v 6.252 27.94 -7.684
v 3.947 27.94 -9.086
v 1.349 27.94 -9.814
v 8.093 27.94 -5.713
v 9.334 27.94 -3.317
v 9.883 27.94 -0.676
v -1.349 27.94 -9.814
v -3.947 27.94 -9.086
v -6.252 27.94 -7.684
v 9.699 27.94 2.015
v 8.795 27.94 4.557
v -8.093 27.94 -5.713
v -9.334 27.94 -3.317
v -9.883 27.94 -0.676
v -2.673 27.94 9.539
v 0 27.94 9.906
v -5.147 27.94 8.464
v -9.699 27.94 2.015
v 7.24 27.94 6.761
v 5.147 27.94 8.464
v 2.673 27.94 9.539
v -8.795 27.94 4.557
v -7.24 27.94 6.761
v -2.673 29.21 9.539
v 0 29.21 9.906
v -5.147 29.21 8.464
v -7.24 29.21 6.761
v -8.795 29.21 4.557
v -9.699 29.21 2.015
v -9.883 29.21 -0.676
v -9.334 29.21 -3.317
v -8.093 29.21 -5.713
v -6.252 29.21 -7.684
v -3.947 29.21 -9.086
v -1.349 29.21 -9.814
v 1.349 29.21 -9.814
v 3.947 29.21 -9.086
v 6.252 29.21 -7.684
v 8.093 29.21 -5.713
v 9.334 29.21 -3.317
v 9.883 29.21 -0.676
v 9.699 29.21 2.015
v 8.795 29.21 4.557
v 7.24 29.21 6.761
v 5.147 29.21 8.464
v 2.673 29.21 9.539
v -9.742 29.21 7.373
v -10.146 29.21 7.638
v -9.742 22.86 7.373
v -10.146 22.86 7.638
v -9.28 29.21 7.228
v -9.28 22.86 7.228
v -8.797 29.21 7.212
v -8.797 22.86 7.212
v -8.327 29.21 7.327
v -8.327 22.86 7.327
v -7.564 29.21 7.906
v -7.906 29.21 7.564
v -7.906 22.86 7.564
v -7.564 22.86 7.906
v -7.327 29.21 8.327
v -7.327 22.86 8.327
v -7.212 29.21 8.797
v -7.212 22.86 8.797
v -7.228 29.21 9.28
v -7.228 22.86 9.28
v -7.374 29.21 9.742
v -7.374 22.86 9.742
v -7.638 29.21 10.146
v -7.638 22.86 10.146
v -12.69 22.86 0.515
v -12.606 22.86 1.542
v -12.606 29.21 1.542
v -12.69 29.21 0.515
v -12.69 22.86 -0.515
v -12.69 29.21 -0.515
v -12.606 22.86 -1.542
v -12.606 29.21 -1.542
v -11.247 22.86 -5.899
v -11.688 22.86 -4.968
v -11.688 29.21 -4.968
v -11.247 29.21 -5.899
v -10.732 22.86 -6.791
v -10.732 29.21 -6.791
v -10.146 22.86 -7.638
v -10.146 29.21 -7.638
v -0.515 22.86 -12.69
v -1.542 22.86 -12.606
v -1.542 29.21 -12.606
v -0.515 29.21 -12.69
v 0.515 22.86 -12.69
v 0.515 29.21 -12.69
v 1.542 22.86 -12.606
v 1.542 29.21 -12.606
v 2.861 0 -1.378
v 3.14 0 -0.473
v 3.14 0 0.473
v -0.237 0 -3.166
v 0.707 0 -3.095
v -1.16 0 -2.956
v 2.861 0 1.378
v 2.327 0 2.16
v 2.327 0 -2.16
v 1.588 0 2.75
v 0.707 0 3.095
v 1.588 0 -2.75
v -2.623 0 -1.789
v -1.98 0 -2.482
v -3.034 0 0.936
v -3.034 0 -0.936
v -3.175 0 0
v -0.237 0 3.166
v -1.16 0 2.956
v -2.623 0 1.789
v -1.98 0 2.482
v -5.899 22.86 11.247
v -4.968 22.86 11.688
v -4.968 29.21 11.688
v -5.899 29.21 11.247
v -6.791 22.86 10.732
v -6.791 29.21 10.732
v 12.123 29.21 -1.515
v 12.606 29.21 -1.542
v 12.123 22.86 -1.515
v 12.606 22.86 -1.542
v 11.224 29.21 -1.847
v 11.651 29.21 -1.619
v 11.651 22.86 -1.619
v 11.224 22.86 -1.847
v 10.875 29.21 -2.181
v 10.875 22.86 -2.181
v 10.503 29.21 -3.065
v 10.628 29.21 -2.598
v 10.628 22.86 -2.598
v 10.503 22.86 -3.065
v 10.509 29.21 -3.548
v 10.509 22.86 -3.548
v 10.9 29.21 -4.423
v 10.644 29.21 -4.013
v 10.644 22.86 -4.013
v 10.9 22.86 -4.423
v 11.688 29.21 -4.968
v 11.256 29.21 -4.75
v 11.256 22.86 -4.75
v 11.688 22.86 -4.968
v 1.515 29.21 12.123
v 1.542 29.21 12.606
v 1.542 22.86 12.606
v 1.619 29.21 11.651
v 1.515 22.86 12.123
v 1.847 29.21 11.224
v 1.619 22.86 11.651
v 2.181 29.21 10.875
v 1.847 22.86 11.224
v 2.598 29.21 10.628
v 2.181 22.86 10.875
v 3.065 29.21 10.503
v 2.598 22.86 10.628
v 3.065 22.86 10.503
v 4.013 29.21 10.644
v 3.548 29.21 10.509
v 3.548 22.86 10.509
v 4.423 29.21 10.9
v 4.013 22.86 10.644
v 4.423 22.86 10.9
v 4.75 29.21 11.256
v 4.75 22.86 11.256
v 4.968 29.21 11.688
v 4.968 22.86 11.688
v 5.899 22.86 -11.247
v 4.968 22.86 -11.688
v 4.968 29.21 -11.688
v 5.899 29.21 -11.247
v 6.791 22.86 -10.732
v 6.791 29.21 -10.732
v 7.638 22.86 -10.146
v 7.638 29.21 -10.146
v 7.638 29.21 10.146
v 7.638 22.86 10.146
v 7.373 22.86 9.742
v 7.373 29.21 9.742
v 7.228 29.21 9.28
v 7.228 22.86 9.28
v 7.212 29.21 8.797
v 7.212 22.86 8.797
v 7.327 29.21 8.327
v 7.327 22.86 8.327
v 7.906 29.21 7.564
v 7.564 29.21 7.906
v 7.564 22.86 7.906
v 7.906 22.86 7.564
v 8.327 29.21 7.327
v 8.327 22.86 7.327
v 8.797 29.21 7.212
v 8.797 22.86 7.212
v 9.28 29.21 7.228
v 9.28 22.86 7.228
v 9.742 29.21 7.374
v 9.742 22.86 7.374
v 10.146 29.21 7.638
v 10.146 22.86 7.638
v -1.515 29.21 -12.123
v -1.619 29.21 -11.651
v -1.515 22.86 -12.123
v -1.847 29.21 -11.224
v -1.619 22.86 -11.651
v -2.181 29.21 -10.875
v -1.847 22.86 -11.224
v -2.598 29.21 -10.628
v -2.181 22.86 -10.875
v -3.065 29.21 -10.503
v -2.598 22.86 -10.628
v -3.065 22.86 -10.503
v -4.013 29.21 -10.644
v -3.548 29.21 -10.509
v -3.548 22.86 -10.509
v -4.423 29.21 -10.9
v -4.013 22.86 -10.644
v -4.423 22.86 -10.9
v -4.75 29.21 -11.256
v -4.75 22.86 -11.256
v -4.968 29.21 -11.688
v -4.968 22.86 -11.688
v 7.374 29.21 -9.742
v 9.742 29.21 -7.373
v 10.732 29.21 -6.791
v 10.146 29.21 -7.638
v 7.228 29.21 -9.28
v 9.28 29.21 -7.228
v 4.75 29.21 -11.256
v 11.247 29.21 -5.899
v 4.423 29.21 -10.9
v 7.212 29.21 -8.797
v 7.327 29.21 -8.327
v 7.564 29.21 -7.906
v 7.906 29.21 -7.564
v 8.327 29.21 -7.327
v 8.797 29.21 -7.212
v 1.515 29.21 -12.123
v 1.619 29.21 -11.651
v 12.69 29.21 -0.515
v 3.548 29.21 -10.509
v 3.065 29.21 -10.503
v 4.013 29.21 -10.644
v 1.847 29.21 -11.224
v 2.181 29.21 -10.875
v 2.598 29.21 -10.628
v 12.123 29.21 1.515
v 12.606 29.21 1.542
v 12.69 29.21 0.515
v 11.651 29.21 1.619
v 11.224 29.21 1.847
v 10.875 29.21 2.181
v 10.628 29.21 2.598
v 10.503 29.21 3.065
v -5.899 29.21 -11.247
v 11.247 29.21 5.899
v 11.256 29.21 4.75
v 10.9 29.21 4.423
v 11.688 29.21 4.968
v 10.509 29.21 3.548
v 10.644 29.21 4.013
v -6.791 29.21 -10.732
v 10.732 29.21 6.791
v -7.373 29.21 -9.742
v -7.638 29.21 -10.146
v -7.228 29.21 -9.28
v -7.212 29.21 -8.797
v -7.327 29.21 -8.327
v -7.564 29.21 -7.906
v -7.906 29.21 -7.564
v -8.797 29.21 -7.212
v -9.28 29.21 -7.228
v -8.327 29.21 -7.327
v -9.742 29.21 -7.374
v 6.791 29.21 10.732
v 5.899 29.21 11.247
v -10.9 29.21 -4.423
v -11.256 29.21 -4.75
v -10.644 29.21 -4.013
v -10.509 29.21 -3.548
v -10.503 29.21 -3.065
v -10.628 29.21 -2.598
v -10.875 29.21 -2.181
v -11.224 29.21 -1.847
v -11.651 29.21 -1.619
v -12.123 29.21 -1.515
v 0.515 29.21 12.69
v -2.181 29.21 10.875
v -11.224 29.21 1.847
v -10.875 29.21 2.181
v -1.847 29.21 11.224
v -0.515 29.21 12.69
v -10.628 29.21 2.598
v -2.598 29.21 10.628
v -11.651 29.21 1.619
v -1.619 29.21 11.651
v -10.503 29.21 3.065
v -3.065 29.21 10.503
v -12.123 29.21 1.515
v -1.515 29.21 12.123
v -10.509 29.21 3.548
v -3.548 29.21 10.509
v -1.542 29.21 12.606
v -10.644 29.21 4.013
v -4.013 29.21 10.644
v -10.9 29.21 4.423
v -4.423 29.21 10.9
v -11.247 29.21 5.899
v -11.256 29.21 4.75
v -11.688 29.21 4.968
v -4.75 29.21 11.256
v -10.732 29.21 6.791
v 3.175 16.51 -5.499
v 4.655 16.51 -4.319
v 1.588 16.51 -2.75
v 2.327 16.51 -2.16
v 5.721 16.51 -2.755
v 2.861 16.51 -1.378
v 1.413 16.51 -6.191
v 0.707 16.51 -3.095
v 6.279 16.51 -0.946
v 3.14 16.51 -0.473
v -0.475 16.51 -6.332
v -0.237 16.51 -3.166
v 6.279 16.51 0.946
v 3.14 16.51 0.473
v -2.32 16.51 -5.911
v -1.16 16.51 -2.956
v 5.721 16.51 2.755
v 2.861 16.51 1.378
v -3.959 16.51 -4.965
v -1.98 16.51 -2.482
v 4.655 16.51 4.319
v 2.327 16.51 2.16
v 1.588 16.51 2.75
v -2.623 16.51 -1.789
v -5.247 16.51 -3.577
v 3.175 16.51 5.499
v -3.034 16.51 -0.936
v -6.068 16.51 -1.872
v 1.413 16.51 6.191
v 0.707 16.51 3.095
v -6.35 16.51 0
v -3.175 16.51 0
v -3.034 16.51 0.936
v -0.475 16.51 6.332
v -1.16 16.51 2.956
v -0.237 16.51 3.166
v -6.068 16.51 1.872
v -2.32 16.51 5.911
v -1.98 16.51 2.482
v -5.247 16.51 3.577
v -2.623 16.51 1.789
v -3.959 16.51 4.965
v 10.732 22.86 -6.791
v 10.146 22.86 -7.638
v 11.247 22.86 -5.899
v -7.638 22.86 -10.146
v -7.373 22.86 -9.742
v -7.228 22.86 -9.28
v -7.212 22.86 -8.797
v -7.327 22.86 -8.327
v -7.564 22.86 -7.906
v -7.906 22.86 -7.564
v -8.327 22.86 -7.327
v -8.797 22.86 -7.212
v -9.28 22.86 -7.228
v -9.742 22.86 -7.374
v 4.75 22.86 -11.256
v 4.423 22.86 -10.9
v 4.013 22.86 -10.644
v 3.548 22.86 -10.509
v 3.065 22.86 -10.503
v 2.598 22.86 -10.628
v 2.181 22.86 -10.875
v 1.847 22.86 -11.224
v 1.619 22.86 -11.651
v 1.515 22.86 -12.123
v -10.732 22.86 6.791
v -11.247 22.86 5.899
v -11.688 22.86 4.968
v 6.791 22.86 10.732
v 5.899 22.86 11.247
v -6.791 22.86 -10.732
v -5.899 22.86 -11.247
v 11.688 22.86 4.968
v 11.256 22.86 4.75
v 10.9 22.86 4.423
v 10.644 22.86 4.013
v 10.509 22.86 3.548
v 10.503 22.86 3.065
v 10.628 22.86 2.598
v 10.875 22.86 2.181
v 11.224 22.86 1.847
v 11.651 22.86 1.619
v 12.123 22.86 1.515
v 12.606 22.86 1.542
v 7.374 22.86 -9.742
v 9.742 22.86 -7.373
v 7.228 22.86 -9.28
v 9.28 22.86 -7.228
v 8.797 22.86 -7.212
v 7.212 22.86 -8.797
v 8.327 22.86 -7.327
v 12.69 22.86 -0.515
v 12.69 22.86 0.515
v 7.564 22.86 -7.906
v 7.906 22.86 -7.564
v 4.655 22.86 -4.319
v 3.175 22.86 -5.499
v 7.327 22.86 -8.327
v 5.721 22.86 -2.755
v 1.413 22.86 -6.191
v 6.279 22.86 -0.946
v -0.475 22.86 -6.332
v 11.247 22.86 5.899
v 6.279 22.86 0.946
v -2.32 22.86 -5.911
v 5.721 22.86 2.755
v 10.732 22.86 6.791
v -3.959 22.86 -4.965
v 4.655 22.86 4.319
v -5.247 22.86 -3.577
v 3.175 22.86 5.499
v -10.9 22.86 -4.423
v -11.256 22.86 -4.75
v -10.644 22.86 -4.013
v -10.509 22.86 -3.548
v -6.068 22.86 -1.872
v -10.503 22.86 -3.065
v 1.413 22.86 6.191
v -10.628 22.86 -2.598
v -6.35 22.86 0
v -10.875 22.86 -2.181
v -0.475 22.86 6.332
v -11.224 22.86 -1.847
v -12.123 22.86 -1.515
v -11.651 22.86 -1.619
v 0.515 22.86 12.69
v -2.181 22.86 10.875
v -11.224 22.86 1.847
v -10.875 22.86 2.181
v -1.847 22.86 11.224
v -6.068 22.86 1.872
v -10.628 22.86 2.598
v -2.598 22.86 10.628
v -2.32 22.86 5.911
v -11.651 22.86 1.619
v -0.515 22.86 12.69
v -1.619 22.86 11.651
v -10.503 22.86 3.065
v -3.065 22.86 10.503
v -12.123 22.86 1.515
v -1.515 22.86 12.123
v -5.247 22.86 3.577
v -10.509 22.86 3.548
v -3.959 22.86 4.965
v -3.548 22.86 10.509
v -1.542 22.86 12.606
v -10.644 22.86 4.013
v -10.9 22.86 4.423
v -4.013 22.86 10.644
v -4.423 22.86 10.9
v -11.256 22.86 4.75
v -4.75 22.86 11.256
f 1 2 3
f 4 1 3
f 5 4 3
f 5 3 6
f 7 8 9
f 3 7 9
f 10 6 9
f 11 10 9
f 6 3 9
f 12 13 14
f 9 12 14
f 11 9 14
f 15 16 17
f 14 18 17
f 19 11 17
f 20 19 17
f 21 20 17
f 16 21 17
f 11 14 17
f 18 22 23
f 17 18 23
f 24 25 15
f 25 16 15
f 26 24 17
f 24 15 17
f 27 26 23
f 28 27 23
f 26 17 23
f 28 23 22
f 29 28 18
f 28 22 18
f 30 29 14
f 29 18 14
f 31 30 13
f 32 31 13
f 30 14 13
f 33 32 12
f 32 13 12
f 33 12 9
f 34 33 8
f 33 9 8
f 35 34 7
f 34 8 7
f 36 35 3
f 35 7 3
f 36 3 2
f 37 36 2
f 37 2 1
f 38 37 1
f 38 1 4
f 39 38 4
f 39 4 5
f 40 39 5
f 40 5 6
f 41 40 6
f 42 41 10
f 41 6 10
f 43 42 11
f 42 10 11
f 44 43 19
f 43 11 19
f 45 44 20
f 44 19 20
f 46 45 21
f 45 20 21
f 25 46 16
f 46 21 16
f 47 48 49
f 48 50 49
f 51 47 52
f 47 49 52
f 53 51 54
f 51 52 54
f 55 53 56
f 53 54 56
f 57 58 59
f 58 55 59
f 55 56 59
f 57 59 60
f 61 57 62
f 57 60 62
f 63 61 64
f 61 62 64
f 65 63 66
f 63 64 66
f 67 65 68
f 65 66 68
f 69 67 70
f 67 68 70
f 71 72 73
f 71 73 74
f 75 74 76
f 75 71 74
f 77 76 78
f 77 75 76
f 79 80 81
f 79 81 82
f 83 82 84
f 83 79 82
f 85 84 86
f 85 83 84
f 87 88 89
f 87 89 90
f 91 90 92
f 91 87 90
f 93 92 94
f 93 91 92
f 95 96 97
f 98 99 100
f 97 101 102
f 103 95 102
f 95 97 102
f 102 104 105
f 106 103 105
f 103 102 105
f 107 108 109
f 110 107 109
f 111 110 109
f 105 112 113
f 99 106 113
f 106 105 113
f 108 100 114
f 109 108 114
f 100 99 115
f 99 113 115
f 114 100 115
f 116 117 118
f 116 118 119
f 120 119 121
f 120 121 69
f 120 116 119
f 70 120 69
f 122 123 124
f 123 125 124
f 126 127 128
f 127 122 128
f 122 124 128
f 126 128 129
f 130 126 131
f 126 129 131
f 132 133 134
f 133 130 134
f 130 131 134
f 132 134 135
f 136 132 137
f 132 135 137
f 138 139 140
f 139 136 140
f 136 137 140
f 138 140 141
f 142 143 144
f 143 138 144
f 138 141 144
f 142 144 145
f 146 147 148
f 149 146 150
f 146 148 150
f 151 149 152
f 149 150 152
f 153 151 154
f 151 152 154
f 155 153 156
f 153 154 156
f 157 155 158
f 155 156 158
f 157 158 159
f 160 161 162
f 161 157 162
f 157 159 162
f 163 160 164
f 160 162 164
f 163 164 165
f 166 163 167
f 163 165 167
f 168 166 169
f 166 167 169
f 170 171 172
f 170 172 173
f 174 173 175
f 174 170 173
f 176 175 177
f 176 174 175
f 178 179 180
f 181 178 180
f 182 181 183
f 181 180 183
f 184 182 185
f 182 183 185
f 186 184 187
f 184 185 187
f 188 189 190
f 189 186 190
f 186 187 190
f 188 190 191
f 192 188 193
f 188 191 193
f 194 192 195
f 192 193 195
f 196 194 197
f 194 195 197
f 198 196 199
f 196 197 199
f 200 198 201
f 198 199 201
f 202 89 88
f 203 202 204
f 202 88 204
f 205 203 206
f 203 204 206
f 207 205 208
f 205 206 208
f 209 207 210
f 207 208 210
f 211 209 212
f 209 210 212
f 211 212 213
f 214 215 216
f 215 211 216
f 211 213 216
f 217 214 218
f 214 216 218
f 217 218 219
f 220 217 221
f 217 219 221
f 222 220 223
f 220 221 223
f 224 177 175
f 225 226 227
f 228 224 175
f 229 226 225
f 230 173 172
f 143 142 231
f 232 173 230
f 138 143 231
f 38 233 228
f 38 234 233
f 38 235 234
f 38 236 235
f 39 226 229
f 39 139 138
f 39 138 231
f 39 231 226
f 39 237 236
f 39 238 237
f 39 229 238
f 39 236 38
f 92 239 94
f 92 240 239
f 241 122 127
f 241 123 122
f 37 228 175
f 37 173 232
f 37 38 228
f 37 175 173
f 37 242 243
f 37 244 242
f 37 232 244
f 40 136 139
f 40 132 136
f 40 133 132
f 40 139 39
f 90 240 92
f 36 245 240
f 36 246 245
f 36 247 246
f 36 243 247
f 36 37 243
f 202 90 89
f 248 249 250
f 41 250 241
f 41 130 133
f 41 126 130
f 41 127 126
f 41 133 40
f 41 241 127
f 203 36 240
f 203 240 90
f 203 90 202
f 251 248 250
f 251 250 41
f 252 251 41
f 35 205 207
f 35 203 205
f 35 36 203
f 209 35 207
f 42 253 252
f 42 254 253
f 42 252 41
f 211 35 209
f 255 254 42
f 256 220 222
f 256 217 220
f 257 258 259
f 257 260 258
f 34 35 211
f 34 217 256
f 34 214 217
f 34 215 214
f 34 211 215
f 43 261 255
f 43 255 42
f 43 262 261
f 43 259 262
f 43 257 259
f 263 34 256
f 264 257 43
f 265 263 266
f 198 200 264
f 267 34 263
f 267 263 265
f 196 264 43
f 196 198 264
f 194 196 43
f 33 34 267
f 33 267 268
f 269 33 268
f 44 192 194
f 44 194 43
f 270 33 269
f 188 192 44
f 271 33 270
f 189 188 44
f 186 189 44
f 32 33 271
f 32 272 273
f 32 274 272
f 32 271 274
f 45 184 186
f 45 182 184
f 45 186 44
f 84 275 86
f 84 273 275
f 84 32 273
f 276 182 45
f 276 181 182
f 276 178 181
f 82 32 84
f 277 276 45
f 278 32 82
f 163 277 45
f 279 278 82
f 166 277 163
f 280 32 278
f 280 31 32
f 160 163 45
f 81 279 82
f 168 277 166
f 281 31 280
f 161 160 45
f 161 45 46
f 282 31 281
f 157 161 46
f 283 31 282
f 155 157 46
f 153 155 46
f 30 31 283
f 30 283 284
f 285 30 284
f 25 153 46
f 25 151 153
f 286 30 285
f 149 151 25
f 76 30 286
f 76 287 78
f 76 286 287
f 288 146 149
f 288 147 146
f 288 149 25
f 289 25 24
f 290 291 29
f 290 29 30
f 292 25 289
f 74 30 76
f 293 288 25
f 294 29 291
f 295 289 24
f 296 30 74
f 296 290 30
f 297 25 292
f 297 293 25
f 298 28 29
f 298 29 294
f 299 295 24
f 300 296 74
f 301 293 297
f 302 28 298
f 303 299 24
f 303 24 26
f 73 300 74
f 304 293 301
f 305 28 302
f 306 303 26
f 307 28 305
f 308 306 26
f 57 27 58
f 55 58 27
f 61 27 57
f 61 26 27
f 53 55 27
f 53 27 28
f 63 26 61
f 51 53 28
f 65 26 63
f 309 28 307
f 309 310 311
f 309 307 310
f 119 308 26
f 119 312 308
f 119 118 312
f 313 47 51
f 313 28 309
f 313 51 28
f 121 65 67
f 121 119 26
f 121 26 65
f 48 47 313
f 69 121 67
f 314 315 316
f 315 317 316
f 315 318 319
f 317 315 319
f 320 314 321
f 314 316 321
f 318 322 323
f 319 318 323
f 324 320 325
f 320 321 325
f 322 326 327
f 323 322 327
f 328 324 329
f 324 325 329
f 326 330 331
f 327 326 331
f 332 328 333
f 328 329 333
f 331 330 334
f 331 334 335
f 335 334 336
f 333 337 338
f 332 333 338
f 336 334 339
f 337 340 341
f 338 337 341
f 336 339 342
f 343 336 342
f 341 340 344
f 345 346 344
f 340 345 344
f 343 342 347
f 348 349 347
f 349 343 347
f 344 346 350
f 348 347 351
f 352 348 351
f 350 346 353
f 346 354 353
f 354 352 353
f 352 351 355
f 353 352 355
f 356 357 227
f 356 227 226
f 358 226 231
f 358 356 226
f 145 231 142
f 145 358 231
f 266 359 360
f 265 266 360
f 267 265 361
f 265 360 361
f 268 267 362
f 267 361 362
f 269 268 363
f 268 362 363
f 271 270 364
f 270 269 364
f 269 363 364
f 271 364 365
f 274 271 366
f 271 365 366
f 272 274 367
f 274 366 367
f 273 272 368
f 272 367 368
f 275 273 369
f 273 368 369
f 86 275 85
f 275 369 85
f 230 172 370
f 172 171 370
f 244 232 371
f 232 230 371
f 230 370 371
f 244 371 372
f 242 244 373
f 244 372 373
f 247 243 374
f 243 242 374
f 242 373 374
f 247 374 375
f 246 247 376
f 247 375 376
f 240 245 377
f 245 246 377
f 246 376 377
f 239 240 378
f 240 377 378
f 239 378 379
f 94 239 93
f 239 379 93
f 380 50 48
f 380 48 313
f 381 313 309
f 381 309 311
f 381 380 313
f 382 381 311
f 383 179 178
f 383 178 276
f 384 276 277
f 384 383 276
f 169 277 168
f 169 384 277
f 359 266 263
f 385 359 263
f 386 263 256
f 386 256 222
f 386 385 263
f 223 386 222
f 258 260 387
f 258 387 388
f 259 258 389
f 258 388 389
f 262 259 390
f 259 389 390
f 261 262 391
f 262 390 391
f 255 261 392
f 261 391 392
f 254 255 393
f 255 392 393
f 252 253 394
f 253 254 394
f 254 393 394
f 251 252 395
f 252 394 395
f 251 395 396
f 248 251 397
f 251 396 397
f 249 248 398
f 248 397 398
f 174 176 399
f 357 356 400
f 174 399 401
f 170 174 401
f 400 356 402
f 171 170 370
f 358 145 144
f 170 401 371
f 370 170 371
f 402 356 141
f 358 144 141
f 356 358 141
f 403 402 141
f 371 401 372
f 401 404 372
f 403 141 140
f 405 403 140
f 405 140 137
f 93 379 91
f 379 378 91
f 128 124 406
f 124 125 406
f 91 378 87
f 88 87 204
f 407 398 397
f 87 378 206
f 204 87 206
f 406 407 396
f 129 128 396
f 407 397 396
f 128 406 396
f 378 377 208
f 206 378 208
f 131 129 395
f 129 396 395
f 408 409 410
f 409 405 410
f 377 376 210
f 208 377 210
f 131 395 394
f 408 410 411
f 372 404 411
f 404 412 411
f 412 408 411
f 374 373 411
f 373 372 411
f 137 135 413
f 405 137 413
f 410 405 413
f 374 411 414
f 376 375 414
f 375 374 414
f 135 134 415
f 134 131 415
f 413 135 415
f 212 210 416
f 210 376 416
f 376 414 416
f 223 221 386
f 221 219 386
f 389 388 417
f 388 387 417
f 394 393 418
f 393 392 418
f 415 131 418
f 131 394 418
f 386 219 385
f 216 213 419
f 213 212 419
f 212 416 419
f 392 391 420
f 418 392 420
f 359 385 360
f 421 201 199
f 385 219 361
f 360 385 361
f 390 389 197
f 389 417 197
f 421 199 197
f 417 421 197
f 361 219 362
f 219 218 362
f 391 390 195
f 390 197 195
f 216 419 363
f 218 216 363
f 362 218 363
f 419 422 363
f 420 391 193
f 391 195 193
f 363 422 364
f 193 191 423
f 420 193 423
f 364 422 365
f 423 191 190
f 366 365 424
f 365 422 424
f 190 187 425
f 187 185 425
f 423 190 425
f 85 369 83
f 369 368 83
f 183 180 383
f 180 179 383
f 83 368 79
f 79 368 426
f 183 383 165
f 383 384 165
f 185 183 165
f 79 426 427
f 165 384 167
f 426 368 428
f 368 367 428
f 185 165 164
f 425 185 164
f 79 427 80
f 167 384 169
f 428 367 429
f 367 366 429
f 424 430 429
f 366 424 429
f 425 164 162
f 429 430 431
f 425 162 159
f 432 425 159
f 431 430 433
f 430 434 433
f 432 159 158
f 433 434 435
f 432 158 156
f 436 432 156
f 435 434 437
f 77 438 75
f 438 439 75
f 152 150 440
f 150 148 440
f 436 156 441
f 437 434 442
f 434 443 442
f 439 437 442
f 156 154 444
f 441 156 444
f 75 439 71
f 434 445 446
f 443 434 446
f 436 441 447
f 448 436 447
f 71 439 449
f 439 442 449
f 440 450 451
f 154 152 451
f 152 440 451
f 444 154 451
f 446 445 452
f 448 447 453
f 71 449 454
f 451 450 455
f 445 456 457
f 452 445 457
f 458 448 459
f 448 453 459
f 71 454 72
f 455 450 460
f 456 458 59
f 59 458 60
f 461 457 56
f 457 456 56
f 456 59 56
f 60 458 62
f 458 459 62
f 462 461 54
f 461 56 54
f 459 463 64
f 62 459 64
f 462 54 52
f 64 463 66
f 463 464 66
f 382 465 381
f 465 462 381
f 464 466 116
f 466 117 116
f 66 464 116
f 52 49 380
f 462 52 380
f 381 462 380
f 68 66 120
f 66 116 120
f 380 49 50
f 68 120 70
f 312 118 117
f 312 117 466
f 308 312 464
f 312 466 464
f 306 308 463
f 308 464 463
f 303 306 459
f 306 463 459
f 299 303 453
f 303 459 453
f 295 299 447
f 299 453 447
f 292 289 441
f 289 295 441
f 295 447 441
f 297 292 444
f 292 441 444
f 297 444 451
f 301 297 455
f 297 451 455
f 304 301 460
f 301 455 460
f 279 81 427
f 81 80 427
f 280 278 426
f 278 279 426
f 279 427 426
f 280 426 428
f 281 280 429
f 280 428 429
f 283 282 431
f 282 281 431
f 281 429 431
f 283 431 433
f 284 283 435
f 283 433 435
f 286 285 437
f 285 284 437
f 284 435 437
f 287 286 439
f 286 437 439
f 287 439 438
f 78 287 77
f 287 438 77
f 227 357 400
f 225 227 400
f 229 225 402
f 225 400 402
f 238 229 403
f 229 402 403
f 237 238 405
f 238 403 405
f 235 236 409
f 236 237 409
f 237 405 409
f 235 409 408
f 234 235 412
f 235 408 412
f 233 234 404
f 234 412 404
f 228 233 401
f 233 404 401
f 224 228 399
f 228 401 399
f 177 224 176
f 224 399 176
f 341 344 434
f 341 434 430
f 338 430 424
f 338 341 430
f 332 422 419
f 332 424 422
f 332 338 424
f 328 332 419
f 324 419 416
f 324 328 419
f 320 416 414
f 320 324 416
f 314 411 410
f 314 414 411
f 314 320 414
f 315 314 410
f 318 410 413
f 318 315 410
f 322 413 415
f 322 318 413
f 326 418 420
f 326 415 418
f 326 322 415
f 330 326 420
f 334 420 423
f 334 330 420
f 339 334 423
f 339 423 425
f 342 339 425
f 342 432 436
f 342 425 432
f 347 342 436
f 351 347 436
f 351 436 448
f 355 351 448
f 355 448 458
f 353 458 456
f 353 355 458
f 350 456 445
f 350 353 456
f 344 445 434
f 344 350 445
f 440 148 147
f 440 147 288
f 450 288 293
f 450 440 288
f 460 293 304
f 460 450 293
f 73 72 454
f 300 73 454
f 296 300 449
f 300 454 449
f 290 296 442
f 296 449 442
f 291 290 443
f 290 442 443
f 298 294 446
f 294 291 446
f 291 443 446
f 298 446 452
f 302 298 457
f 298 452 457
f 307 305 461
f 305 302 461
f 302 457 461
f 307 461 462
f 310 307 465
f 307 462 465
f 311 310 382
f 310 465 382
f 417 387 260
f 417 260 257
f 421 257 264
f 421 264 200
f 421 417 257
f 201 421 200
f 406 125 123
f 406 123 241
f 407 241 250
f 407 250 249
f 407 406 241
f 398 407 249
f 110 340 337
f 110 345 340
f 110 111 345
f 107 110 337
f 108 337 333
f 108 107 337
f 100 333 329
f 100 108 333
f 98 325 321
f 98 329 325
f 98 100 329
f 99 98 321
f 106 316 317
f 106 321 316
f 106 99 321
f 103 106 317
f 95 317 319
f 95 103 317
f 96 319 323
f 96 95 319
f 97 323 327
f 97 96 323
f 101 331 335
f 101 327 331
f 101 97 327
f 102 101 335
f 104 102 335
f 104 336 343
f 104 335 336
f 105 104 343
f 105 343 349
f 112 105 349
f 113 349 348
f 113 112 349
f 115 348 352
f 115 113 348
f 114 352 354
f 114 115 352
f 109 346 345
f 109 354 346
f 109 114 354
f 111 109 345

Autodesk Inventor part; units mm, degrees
ref_plane "YZ Plane" through (0, 0, 0) normal (1, 0, 0) x (0, 1, 0)
ref_plane "XZ Plane" through (0, 0, 0) normal (0, 1, 0) x (-1, 0, 0)
ref_plane "XY Plane" through (0, 0, 0) normal (0, 0, 1) x (1, 0, 0)
sketch "Sketch1" plane through (0, 0, 0) normal (0, 0, 1) x (1, 0, 0)
  line L0 (0, 0) -> (0, 29.21)
  line L1 (0, 29.21) -> (-12.7, 29.21)
  line L2 (-12.7, 29.21) -> (-12.7, 22.86)
  line L3 (-12.7, 22.86) -> (-6.35, 22.86)
  line L4 (-6.35, 22.86) -> (-6.35, 16.51)
  line L5 (-6.35, 16.51) -> (-3.175, 16.51)
  line L6 (-3.175, 16.51) -> (-3.175, 0)
  line L7 (-3.175, 0) -> (0, 0)
  dimension "d0" = 29.21
  dimension "d1" = 12.7
  dimension "d2" = 6.35
  dimension "d3" = 6.35
  dimension "d4" = 6.35
  dimension "d5" = 3.175
revolve "Revolution1" add sketch "Sketch1" angle 360 about axis through (0, 0, 0) along (0, 1, 0)
sketch "Sketch2" plane through (0, 29.21, 0) normal (0, 1, 0) x (1, 0, 0)
  circle A0 centre (0, 0) radius 9.906
  dimension "d7" = 19.812
sketch "Sketch3" plane through (0, 29.21, 0) normal (0, 1, 0) x (1, 0, 0)
  line L0 (0, 0) -> (-3.287, 12.2673)
  line L1 (0, 0) -> (0, 12.62)
  dimension "d8" = 12.7
  dimension "d9" = 15
hole "Hole1" at (-3.287, 29.21, -12.2673) direction (0, -1, 0) diameter 3.556 end through all
pattern_circular "Circular Pattern1" count 12 over 360 about axis through (0, 26.035, 0) along (0, 1, 0) of "Hole1"
hole "Hole2" at (0, 29.21, 0) direction (0, -1, 0) diameter 19.812 depth 1.27
thread "Thread1" size "1/4-20 UNC" class "2A" standard "ANSI Unified Screw Threads" length 25.4 offset 8.128
properties part number "Lopez_Knob" material "Polypropylene"
